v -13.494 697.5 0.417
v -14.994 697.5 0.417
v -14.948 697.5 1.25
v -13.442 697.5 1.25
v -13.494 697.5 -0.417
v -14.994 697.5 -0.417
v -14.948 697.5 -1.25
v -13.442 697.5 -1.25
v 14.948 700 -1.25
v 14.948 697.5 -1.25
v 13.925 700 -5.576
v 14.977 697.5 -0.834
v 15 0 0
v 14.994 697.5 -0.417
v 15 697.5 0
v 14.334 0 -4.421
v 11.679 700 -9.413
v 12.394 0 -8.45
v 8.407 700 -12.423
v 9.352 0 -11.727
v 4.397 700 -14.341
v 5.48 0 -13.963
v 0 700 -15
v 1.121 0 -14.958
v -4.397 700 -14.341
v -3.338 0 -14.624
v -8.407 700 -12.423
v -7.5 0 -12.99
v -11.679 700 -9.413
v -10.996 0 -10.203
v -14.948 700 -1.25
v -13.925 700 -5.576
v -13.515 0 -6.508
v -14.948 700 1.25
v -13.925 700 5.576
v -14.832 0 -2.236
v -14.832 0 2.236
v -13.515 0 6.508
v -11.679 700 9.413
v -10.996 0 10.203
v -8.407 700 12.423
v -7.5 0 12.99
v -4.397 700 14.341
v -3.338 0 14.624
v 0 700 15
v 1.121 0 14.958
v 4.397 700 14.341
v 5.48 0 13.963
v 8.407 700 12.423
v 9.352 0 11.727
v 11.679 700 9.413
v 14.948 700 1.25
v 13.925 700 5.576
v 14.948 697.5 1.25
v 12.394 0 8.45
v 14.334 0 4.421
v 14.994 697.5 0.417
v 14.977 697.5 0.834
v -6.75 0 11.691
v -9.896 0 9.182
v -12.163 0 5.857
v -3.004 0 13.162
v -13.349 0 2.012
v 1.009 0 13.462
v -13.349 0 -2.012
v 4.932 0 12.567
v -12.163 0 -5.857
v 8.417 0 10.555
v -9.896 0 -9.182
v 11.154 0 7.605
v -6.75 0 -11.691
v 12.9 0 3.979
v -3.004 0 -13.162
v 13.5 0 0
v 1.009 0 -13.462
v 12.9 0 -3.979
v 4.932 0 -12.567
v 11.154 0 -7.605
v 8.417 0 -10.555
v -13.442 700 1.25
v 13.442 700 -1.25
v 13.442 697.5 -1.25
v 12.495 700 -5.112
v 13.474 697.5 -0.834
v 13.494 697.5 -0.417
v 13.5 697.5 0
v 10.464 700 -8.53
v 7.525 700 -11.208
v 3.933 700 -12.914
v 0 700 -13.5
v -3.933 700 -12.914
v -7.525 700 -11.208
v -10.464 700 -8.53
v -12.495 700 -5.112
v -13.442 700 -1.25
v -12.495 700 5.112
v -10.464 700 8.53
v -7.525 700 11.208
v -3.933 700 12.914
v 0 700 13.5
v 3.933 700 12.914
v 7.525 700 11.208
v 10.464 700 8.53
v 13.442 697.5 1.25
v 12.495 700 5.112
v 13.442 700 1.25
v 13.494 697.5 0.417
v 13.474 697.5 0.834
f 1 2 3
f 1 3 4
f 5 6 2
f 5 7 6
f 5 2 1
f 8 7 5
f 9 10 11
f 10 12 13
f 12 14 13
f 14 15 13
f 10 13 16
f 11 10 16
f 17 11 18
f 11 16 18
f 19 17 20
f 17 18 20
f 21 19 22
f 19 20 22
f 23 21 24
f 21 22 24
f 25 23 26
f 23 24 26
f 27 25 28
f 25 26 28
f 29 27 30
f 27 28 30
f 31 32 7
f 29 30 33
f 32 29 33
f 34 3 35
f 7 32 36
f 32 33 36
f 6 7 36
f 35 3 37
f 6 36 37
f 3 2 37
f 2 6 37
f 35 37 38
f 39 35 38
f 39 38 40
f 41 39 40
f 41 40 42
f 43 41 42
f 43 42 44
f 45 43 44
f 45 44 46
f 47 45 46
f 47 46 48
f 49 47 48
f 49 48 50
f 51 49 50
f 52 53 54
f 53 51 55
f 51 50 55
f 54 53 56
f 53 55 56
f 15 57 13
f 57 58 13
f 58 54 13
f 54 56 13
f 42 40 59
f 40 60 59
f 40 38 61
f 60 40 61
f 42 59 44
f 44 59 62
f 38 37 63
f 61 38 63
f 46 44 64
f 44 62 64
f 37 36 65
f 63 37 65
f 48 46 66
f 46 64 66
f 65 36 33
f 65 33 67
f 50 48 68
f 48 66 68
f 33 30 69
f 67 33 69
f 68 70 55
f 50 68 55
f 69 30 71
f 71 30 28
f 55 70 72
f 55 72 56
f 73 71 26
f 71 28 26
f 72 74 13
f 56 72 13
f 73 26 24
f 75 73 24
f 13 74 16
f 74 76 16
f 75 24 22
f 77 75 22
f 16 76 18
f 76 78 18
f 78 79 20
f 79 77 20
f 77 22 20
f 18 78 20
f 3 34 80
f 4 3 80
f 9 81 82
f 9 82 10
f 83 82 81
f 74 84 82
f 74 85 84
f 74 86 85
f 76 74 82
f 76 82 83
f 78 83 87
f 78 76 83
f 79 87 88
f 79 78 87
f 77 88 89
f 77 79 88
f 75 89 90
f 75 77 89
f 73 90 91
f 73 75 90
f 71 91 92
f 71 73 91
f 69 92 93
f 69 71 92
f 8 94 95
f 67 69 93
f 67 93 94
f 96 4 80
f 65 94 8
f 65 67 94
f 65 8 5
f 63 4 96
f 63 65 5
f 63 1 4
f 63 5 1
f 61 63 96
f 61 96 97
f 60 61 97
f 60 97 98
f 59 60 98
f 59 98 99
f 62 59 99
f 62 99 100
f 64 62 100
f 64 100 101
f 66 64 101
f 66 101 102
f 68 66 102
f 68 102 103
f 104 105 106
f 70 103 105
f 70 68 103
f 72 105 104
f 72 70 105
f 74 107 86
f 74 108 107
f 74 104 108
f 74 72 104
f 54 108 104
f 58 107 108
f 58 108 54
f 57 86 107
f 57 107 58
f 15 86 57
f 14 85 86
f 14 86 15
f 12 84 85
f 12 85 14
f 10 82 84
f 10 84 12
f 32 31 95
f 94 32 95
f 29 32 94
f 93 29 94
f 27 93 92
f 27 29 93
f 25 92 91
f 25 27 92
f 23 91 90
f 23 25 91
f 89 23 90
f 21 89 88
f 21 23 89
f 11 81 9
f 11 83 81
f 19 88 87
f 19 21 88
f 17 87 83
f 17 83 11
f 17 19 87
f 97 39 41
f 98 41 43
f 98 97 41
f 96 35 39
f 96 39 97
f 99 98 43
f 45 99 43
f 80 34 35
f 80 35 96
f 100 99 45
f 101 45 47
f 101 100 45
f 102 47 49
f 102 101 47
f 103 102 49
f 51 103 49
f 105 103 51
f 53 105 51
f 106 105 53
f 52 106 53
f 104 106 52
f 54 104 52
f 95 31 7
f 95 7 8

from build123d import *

# Parameters (mm, degrees)
SKETCH1_R           = 15
SKETCH1_R_2         = 13.5
BOSS_EXTRUDE1_DEPTH = 700
SKETCH2_W           = 30
SKETCH2_H           = 2.5
CUT_EXTRUDE1_DEPTH  = 2.5


with BuildPart() as part:
    # Sketch1 → Boss-Extrude1 (new body)
    with BuildSketch(Plane(origin=(0, 0, 0), x_dir=(1, 0, 0), z_dir=(0, 1, 0))):
        Circle(SKETCH1_R)
        Circle(SKETCH1_R_2, mode=Mode.SUBTRACT)
    extrude(amount=BOSS_EXTRUDE1_DEPTH)

    # Sketch2 → Cut-Extrude1 (cut)
    with BuildSketch(Plane(origin=(0, 700, 0), x_dir=(1, 0, 0), z_dir=(0, 1, 0))):
        Rectangle(SKETCH2_W, SKETCH2_H)
    extrude(amount=-CUT_EXTRUDE1_DEPTH, mode=Mode.SUBTRACT)


solid = part.part
